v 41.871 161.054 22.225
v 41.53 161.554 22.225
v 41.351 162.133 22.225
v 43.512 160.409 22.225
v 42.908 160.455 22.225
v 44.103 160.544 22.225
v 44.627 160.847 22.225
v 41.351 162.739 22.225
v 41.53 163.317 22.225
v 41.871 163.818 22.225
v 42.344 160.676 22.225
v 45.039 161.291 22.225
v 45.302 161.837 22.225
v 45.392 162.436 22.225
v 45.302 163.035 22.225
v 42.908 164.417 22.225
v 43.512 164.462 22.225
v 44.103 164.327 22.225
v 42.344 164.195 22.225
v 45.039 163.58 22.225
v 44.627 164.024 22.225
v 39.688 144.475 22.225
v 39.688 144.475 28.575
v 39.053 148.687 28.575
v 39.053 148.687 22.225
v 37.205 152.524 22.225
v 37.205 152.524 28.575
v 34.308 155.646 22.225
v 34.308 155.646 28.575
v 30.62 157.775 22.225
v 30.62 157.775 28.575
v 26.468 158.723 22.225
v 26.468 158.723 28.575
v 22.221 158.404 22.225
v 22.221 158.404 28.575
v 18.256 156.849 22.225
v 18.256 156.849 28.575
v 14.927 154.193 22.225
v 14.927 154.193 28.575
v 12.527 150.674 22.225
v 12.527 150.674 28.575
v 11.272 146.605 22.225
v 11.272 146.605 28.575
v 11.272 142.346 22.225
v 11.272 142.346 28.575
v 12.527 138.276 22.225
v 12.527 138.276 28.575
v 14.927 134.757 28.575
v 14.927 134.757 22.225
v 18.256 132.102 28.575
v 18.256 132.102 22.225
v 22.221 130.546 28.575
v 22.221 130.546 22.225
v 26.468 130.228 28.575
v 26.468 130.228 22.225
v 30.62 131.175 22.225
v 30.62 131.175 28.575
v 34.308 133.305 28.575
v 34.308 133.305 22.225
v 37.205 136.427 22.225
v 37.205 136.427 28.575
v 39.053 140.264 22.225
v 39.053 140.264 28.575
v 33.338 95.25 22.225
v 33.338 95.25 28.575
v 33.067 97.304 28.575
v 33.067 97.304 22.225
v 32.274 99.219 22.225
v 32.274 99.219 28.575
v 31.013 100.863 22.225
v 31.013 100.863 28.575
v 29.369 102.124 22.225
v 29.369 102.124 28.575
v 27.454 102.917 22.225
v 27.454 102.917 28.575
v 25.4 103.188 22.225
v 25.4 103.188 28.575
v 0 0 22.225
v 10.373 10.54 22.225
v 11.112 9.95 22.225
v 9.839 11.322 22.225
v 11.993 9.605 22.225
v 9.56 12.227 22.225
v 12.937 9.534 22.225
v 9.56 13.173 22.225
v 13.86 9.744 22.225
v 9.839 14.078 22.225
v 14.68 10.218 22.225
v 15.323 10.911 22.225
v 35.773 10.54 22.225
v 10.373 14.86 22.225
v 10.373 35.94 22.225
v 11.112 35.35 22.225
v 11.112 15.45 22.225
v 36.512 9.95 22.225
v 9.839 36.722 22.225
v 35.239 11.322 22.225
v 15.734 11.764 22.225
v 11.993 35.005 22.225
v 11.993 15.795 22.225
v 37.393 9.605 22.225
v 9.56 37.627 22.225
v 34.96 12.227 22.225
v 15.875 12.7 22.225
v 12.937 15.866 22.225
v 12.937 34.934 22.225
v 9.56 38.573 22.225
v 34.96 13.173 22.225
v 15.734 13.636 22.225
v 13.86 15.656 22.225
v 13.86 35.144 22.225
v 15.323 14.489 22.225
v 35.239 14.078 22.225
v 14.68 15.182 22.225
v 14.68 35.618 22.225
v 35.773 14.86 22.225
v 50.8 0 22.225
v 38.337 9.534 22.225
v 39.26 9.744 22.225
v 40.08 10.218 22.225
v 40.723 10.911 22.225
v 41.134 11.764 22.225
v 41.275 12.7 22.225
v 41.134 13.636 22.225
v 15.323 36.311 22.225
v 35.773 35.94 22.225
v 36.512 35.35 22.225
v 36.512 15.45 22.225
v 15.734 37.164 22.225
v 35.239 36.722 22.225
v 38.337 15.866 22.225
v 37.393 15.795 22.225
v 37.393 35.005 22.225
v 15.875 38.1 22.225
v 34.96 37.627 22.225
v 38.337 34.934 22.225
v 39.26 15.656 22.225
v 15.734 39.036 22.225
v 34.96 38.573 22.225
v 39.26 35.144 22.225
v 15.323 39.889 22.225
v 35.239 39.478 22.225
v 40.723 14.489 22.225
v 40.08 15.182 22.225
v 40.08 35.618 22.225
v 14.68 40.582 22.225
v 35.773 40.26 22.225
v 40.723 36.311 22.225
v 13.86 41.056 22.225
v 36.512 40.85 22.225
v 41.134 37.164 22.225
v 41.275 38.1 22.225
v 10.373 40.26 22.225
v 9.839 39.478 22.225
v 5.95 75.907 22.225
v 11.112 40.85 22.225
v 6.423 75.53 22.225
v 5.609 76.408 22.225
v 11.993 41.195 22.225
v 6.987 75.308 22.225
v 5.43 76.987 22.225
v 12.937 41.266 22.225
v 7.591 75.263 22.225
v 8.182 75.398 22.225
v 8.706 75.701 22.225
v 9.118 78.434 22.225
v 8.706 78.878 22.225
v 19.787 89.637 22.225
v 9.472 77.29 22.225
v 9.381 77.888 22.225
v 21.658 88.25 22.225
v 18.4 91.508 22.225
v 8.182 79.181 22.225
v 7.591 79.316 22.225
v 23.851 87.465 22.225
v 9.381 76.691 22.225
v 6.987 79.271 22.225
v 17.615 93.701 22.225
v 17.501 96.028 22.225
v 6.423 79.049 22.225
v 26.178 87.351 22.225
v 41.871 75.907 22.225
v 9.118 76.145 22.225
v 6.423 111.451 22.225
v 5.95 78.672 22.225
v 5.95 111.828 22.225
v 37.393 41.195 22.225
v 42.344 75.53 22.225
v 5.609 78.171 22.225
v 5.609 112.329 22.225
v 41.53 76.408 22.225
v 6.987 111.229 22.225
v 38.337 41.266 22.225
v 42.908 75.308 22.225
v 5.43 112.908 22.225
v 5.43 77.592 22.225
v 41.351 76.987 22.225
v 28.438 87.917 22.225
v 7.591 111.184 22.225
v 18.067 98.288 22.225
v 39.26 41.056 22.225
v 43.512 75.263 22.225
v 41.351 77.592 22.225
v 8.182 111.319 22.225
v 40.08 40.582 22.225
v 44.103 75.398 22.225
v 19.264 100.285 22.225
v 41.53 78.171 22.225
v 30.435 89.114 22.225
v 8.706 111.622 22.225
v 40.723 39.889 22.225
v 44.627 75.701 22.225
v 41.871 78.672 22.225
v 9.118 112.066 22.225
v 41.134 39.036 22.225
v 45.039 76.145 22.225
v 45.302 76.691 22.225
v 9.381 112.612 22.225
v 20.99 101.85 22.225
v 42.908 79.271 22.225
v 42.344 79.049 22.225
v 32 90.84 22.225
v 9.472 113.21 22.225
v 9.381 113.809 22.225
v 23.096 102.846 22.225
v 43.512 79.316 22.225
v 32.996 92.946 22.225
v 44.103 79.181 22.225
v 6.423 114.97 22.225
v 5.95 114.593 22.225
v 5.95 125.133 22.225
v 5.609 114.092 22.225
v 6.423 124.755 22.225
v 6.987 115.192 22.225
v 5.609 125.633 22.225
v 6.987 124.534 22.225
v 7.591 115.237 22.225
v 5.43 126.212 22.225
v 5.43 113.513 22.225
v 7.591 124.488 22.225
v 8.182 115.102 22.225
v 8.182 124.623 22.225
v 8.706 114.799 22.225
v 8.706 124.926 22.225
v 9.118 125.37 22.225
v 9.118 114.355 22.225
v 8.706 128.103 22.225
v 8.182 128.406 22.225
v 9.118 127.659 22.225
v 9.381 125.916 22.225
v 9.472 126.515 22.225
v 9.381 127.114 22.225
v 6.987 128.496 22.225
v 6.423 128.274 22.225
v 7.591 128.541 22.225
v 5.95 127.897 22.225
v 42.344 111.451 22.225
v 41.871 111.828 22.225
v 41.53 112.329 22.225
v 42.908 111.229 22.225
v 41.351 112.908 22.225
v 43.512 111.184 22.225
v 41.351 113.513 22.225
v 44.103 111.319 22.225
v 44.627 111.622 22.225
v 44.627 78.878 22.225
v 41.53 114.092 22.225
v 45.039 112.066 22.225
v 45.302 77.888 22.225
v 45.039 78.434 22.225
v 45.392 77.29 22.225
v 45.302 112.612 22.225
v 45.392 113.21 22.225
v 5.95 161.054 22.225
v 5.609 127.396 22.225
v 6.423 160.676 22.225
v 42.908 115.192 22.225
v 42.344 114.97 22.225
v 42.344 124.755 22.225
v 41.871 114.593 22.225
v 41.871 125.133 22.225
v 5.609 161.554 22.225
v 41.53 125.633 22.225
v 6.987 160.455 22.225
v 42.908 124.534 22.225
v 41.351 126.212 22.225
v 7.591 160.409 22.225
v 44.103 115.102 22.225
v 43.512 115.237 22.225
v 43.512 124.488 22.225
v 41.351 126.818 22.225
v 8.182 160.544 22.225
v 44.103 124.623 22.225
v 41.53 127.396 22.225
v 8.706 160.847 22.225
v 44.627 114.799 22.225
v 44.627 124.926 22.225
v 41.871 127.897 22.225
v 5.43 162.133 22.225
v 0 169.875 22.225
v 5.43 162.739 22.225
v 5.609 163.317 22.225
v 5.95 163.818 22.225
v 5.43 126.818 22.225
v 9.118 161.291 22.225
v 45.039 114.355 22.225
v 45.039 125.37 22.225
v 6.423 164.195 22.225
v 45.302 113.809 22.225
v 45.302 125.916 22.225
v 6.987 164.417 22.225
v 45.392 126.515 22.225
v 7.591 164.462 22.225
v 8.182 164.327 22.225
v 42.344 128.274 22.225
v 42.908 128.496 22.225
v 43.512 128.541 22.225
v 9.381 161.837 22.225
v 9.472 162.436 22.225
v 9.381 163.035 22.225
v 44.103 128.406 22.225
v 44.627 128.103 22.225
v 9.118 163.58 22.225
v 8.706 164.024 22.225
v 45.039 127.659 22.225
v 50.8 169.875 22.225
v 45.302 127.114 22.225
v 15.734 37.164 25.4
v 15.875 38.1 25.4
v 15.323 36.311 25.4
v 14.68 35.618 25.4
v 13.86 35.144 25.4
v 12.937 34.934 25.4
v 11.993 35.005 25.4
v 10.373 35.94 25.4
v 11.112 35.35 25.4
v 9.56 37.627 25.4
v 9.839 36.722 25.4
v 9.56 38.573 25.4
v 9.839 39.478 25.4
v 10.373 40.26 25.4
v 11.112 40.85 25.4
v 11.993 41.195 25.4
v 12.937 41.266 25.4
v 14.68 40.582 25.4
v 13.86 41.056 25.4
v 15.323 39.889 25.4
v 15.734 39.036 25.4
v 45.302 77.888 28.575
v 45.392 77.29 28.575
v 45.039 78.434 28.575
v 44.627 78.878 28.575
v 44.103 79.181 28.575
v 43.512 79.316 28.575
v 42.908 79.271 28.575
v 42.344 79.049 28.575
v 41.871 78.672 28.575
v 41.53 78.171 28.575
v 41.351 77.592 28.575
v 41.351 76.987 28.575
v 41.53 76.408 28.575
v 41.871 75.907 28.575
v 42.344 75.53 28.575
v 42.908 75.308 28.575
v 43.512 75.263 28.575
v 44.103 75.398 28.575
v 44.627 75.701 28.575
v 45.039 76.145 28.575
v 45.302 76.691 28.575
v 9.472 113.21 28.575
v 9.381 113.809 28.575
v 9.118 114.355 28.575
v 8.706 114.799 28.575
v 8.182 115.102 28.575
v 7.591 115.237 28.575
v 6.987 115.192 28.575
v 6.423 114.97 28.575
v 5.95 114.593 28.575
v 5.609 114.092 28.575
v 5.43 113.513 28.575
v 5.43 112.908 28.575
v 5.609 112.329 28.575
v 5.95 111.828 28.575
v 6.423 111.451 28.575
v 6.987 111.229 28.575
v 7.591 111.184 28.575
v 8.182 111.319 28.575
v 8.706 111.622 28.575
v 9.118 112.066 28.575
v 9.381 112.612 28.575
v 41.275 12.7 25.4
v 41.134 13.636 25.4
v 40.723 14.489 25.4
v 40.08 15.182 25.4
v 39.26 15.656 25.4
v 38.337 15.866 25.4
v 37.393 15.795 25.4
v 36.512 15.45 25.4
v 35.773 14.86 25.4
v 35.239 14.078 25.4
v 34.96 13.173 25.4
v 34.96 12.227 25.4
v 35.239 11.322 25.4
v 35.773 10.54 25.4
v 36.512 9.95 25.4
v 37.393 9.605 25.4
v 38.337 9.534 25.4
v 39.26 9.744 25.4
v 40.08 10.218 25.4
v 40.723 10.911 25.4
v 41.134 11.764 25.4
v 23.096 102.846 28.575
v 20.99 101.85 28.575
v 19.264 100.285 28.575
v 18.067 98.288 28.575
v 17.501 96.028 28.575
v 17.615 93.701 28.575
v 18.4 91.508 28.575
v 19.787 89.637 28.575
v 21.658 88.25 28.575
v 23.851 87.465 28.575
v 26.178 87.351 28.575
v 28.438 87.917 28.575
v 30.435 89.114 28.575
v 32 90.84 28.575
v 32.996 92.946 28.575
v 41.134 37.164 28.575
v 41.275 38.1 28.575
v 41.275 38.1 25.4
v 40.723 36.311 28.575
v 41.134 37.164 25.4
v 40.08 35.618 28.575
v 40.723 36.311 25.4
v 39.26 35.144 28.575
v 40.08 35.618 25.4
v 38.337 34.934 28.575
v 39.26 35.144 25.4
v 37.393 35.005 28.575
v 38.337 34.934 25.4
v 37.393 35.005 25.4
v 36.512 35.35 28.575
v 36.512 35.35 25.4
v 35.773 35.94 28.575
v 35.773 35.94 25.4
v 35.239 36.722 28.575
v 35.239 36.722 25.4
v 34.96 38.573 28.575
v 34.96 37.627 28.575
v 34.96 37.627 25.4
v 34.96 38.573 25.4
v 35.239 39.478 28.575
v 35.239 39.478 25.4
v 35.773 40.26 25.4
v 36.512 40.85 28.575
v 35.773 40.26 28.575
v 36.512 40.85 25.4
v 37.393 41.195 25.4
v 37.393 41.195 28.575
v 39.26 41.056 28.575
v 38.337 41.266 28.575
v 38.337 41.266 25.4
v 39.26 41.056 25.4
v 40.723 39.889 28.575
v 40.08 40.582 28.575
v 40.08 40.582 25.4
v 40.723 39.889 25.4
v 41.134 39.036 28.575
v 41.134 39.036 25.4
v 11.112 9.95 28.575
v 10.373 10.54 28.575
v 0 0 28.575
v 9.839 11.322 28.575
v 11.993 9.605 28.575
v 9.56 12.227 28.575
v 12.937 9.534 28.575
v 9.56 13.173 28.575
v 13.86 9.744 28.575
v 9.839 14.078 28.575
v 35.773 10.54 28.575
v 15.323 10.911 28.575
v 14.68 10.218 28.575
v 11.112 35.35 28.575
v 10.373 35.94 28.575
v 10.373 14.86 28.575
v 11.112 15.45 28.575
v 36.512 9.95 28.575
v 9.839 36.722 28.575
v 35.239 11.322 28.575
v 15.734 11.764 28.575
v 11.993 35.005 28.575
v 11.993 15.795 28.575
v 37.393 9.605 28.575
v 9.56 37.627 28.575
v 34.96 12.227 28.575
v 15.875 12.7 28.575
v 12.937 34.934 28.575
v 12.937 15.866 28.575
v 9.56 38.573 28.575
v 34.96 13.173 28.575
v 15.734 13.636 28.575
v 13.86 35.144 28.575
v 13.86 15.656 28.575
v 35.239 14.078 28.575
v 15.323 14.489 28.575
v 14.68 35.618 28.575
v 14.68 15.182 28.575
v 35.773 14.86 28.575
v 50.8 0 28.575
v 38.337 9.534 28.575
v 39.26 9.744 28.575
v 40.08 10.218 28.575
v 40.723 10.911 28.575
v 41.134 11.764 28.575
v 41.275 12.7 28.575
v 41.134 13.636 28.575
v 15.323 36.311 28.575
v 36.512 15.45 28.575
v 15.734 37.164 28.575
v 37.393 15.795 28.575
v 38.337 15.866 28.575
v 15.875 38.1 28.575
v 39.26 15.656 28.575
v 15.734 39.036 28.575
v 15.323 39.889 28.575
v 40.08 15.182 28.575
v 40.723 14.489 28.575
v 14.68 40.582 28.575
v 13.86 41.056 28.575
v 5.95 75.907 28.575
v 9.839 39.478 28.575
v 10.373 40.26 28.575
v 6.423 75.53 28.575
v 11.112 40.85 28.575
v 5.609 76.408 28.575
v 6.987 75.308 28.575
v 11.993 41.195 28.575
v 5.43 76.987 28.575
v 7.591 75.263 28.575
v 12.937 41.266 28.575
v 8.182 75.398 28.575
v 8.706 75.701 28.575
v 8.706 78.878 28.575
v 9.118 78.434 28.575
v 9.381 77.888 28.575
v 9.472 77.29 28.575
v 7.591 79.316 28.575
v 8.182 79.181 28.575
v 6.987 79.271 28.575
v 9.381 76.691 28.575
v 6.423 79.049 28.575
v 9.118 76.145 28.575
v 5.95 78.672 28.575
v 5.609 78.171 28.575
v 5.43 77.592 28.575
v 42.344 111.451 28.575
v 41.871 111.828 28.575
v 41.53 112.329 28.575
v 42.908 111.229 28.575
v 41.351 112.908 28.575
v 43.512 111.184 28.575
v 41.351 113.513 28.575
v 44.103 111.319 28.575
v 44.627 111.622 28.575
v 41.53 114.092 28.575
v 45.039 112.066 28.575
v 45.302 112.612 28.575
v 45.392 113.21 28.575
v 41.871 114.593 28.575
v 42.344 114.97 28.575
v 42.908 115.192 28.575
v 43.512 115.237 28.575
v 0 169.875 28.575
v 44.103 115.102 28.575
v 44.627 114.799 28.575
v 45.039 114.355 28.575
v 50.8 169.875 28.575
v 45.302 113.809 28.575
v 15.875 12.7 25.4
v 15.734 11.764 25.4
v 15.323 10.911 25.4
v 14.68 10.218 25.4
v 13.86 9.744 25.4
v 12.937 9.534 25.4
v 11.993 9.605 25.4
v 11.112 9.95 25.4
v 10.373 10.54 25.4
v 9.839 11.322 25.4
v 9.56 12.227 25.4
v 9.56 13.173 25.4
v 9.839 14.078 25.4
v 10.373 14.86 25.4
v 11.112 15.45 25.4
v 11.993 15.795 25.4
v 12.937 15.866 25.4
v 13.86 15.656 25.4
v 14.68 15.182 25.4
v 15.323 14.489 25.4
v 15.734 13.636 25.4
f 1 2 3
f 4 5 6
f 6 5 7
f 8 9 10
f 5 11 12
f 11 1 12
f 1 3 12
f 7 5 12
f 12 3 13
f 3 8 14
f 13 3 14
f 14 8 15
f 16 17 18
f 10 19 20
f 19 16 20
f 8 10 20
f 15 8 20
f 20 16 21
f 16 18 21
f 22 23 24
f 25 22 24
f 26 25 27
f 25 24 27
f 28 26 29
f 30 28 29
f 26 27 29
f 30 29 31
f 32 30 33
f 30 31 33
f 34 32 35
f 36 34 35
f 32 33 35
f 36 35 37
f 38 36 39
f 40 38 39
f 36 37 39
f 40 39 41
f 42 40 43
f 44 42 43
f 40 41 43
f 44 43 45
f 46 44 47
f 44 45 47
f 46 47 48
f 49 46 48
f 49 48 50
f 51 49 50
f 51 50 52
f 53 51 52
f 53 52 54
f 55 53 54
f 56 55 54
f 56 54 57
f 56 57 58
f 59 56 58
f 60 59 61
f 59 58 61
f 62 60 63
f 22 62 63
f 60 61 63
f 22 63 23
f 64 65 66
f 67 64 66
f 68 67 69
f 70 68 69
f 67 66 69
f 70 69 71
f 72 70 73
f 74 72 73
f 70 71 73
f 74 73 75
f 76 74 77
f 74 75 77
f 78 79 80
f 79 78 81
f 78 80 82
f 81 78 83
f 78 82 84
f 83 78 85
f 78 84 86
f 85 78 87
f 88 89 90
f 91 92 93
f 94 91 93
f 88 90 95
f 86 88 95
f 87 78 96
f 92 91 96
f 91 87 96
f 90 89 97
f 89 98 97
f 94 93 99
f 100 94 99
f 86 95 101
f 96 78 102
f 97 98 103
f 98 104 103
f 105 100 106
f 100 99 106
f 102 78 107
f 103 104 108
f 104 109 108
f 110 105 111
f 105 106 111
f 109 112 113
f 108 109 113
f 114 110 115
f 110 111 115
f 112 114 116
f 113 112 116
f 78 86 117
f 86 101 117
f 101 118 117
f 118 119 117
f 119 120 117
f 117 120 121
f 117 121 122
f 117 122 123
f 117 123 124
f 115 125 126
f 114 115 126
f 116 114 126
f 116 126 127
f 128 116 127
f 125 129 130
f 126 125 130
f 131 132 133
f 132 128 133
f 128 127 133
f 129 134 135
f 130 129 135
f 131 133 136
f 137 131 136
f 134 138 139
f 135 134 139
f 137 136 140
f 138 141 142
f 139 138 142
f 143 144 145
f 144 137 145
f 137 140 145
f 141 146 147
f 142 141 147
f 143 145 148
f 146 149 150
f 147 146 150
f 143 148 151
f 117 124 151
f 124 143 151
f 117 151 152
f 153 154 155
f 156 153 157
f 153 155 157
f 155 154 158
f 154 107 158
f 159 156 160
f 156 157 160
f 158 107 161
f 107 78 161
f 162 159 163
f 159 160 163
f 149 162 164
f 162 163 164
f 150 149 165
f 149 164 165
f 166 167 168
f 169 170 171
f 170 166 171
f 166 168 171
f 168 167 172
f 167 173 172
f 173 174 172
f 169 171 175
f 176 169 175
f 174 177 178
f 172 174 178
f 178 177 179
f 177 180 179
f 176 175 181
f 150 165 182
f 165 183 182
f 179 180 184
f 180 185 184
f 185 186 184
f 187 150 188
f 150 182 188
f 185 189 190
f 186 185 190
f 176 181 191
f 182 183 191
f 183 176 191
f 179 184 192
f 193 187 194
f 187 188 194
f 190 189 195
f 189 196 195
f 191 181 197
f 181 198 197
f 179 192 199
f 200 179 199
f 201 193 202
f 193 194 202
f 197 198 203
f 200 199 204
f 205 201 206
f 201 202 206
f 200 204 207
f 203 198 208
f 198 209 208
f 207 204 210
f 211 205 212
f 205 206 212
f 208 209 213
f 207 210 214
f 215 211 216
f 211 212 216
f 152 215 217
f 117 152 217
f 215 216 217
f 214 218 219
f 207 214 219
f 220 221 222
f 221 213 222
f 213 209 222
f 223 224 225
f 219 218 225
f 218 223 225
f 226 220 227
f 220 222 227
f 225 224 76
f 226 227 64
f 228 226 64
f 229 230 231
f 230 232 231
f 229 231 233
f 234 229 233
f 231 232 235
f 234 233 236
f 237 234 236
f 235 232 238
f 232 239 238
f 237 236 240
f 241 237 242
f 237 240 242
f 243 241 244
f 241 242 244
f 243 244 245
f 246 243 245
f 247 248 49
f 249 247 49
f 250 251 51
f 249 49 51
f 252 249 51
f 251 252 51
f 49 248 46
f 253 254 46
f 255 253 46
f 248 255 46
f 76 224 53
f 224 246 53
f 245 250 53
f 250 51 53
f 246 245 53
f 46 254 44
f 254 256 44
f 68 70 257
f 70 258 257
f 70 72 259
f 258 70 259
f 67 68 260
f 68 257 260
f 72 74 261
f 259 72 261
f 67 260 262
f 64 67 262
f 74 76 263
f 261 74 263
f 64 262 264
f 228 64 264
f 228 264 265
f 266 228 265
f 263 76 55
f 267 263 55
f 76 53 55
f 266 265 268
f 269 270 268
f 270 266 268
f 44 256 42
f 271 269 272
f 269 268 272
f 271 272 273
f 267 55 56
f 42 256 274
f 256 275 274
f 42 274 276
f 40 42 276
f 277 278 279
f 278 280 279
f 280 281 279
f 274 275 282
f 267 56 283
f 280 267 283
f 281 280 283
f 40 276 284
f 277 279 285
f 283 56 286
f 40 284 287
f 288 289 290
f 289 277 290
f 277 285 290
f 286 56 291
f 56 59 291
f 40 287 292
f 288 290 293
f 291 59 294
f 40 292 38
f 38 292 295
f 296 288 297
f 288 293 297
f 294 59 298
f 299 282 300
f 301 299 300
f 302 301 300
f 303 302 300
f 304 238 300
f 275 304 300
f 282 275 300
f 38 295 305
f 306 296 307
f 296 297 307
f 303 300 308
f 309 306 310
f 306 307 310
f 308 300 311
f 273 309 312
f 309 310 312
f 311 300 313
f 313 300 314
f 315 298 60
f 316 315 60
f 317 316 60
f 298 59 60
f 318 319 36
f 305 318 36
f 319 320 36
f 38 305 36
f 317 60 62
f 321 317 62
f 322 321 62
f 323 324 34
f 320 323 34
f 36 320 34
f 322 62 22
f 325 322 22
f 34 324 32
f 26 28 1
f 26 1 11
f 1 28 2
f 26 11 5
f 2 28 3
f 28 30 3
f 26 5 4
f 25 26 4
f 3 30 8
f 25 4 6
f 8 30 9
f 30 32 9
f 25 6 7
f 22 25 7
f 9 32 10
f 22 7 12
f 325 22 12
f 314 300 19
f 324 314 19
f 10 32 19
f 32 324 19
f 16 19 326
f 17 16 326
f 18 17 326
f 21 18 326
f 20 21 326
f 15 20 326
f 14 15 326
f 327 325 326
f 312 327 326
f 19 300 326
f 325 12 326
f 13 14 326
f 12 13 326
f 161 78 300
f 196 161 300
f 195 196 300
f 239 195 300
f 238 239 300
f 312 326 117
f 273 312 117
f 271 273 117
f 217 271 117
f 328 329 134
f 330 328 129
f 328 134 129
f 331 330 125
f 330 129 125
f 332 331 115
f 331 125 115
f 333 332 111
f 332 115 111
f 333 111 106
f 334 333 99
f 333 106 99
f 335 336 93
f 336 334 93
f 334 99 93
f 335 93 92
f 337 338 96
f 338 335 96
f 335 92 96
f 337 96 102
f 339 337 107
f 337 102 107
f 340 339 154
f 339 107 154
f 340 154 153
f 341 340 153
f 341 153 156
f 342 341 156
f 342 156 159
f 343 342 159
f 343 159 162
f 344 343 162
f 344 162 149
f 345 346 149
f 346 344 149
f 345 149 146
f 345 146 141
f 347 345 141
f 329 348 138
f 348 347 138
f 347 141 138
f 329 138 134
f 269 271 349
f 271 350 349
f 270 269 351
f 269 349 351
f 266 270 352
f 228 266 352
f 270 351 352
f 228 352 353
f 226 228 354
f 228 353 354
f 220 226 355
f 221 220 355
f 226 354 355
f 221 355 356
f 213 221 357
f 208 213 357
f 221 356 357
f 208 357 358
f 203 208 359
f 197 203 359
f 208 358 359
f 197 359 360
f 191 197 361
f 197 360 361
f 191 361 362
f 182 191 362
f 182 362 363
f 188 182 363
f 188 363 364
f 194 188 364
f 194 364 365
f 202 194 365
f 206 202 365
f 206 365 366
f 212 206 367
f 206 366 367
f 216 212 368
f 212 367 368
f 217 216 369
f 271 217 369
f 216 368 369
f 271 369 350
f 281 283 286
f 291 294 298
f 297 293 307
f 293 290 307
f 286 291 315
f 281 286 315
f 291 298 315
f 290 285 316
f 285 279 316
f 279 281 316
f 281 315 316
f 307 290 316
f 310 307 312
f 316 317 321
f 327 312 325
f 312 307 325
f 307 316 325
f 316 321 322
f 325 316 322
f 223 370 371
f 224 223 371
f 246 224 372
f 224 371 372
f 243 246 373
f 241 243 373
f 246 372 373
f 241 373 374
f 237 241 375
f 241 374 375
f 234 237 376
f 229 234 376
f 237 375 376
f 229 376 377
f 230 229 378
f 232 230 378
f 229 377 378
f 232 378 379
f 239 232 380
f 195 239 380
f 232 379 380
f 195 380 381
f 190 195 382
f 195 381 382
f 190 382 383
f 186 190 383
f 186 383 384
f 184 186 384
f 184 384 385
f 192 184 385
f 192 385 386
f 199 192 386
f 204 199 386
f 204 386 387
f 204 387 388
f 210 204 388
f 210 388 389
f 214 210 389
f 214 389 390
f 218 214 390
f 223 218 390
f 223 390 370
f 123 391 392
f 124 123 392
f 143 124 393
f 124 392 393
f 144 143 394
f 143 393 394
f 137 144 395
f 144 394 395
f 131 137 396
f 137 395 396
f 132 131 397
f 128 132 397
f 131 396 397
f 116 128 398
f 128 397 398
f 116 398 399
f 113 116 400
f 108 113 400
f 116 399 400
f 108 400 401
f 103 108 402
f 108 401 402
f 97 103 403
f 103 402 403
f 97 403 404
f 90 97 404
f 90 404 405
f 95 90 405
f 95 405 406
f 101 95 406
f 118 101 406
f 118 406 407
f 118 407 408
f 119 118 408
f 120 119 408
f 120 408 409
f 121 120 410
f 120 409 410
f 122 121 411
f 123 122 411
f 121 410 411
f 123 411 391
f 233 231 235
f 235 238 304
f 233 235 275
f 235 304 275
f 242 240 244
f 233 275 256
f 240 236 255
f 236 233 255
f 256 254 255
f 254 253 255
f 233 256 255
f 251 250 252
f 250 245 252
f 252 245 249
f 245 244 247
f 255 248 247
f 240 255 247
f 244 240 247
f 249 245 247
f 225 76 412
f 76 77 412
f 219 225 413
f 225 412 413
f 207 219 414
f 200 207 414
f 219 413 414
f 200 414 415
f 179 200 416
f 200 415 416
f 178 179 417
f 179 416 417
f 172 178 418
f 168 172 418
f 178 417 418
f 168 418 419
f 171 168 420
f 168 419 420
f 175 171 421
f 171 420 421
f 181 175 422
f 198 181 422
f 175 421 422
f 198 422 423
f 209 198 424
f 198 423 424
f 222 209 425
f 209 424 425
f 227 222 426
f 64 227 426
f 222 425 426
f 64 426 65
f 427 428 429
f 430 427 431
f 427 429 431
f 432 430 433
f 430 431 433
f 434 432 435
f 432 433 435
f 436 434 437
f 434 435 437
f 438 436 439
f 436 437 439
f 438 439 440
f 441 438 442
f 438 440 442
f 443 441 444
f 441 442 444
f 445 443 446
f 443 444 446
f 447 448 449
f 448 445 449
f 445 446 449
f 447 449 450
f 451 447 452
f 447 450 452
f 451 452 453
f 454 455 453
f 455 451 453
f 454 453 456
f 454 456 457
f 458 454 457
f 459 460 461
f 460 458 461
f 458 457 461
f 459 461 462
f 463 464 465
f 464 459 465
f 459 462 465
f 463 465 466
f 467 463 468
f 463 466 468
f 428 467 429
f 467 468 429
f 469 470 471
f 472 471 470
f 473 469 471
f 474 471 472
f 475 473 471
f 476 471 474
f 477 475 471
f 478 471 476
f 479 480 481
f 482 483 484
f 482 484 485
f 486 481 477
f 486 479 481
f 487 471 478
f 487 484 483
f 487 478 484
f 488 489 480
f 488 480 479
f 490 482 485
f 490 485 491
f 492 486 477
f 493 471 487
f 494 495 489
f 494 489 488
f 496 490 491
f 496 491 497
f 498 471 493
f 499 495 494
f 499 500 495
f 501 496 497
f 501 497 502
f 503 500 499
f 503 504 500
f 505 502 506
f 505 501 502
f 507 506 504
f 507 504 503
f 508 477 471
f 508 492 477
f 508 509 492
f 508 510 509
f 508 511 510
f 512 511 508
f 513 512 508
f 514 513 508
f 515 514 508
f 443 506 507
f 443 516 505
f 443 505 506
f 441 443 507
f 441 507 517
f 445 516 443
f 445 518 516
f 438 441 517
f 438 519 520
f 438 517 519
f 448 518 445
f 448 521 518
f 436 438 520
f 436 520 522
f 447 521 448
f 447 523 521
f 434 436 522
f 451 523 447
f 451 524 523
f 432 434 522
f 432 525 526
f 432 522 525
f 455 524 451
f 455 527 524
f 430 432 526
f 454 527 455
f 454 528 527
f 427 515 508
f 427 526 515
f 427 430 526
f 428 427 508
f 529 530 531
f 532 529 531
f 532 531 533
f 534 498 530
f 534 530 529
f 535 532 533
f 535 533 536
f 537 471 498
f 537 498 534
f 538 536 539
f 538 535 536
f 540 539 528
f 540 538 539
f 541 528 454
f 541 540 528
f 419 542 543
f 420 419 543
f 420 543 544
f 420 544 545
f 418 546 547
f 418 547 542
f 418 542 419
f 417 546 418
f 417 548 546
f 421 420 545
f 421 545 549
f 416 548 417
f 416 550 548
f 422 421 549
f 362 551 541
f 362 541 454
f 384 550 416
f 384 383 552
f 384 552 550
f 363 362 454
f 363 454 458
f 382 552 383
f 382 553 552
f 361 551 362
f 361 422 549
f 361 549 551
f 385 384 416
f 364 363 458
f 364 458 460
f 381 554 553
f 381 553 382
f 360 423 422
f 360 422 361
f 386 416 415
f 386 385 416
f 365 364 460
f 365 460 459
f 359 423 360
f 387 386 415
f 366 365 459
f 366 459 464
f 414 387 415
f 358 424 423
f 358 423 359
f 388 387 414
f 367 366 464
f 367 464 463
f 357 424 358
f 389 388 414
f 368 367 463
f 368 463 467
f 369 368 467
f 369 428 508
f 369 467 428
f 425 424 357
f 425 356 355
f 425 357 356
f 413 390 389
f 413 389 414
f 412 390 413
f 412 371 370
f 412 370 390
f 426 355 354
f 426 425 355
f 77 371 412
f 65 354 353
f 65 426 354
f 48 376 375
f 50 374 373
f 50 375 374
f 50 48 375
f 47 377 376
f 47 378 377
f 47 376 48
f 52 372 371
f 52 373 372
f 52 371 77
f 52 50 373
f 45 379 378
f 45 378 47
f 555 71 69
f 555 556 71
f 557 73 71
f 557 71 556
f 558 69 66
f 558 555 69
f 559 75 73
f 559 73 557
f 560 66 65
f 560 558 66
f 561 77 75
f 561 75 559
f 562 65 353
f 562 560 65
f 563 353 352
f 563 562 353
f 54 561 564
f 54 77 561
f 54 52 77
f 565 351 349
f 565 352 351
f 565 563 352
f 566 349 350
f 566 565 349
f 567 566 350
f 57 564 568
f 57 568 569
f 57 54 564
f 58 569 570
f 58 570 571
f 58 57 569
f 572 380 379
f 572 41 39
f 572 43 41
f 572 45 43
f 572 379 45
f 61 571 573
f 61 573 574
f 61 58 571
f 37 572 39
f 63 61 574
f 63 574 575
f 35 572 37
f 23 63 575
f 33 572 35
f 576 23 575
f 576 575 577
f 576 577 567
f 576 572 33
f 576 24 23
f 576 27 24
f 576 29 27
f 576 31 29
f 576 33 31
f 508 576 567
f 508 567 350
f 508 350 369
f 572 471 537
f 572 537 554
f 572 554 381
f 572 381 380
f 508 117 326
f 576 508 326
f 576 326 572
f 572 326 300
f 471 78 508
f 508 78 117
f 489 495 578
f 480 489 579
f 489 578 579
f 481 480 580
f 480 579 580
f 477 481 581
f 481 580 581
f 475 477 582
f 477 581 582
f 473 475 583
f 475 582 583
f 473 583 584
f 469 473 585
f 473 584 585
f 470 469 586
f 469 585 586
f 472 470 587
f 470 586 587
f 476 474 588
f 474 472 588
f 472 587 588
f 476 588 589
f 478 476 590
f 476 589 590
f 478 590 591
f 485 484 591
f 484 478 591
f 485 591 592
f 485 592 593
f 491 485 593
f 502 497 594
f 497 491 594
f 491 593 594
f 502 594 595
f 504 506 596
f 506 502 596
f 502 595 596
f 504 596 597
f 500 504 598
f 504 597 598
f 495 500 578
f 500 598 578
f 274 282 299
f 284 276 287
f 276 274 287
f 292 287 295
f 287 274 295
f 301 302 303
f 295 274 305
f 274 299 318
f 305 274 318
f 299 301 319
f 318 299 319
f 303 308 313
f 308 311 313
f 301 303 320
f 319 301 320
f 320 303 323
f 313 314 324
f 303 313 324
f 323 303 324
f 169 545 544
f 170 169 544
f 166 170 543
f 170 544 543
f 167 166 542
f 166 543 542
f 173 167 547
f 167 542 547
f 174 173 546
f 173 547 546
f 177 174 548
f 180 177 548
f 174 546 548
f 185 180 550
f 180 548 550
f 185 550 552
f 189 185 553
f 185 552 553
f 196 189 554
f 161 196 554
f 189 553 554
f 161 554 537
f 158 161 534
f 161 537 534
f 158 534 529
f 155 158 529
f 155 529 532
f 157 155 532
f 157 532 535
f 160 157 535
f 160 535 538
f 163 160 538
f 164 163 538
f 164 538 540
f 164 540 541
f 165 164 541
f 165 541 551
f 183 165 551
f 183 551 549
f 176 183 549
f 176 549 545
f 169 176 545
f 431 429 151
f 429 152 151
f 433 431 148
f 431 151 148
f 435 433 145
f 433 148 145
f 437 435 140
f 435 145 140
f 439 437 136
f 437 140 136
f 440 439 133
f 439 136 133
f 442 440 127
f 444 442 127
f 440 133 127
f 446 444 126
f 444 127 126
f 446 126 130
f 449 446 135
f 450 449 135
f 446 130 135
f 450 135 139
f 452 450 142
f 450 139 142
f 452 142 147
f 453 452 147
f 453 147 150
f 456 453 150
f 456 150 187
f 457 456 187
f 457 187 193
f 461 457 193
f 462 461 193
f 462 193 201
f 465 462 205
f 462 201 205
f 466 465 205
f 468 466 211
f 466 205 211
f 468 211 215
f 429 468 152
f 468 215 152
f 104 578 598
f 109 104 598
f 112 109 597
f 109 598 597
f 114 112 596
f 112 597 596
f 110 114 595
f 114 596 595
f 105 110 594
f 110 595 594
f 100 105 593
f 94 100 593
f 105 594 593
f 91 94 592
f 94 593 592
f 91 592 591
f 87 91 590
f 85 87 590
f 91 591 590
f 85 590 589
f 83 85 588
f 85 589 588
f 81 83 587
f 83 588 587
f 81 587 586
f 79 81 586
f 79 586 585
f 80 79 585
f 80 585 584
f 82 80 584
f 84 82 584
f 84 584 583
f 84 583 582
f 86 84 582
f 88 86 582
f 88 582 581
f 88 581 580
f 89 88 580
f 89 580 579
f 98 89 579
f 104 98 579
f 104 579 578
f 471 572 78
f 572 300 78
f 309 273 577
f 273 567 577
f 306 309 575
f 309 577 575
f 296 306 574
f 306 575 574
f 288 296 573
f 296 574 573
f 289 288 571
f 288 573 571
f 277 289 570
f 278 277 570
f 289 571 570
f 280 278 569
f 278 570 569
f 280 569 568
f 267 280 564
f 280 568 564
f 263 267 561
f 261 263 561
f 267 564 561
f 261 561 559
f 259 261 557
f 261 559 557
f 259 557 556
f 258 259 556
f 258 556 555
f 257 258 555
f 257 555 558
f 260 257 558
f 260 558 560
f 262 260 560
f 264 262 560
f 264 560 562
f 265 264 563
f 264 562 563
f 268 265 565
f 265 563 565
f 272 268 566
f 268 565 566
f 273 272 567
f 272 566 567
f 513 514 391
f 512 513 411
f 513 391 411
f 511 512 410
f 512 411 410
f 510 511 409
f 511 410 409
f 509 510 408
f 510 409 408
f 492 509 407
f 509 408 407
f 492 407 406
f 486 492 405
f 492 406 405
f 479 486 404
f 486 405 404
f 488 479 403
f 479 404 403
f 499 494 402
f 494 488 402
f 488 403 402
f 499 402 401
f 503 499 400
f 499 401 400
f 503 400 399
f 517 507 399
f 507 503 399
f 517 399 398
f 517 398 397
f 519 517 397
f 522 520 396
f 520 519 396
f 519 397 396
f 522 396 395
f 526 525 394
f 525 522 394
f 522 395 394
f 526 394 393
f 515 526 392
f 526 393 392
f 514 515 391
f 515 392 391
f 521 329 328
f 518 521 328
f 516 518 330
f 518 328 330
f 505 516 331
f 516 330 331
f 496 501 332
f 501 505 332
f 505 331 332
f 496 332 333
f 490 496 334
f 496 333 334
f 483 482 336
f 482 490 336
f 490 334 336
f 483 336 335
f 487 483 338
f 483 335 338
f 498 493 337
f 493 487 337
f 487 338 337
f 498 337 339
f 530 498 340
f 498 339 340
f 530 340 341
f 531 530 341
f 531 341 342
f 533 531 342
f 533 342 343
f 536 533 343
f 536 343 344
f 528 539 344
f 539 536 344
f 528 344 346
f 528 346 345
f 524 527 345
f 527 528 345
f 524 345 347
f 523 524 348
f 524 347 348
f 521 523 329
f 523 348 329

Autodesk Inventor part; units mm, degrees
ref_plane "YZ Plane" through (0, 0, 0) normal (1, 0, 0) x (0, 1, 0)
ref_plane "XZ Plane" through (0, 0, 0) normal (0, 1, 0) x (-1, 0, 0)
ref_plane "XY Plane" through (0, 0, 0) normal (0, 0, 1) x (1, 0, 0)
sketch "Sketch1" plane through (0, 0, 0) normal (0, 0, 1) x (1, 0, 0)
  line L0 (0, 0) -> (50.8, 0)
  line L1 (50.8, 0) -> (50.8, 169.8752)
  line L2 (50.8, 169.8752) -> (0, 169.8752)
  line L3 (0, 169.8752) -> (0, 0)
  line L4 (25.4, 169.8752) -> (25.4, 144.4752)
  line L5 (25.4, 169.8752) -> (50.8, 169.8752) construction
  circle A0 centre (25.4, 144.4752) radius 14.2875
  line L6 (25.4, 144.4752) -> (43.3605, 162.4357)
  line L7 (25.4, 144.4752) -> (50.8, 144.4752) construction
  line L8 (7.4395, 126.5147) -> (43.3605, 126.5147)
  line L9 (43.3605, 162.4357) -> (7.4395, 162.4357)
  line L10 (7.4395, 162.4357) -> (7.4395, 126.5147)
  circle A1 centre (7.4395, 162.4357) radius 2.032
  circle A2 centre (7.4395, 126.5147) radius 2.032
  circle A3 centre (43.3605, 162.4357) radius 2.032
  circle A4 centre (43.3605, 126.5147) radius 2.032
  line L11 (0, 0) -> (50.8, 0)
  line L12 (50.8, 0) -> (50.8, 38.1)
  line L13 (0, 38.1) -> (0, 0)
  line L14 (25.4, 38.1) -> (12.7, 38.1)
  line L15 (25.4, 38.1) -> (38.1, 38.1) construction
  line L16 (12.7, 38.1) -> (38.1, 38.1)
  circle A5 centre (12.7, 38.1) radius 3.175
  circle A6 centre (38.1, 38.1) radius 3.175
  dimension "d0" = 50.8
  dimension "d1" = 169.8752
  dimension "d2" = 25.4
  dimension "d3" = 90
  dimension "d4" = 28.575
  dimension "d5" = 25.4
  dimension "d6" = 45
  dimension "d7" = 50.8
  dimension "d9" = 4.064
  dimension "d10" = 4.064
  dimension "d11" = 4.064
  dimension "d12" = 4.064
  dimension "d13" = 50.8
  dimension "d14" = 38.1
  dimension "d15" = 12.7
  dimension "d16" = 180
  dimension "d17" = 25.4
  dimension "d18" = 0
  dimension "d19" = 6.35
  dimension "d20" = 6.35
extrude "Extrusion1" add sketch "Sketch1" along normal blind 25.4 contours L9 A3 L6 A0 L4 | L3 L2 L1 L0
sketch "Sketch2" plane through (0, 169.8752, 0) normal (0, 1, 0) x (1, 0, 0)
  line L0 (0, 0) -> (3.175, 0)
  line L1 (3.175, 0) -> (3.175, -3.175)
  line L2 (3.175, -3.175) -> (0, -3.175)
  line L3 (0, -3.175) -> (0, 0)
  line L4 (3.175, -3.175) -> (47.625, -3.175)
  line L5 (47.625, -3.175) -> (47.625, -22.225)
  line L6 (47.625, -22.225) -> (3.175, -22.225)
  line L7 (3.175, -22.225) -> (3.175, -3.175)
  dimension "d23" = 3.175
  dimension "d24" = 3.175
  dimension "d25" = 44.45
  dimension "d26" = 19.05
extrude "Extrusion2" cut sketch "Sketch2" against normal blind 254 contours L4 L5 L6 L7
sketch "Sketch3" plane through (0, 0, 25.4) normal (0, 0, 1) x (1, 0, 0)
  circle A0 centre (12.7, 38.1) radius 3.175 projected
  line L0 (12.7, 38.1) -> (38.1, 38.1)
  line L1 (38.1, 38.1) -> (38.1, 12.7)
  line L2 (38.1, 12.7) -> (12.7, 12.7)
  line L3 (12.7, 12.7) -> (12.7, 38.1)
  circle A1 centre (12.7, 12.7) radius 3.175
  circle A2 centre (38.1, 12.7) radius 3.175
  dimension "d29" = 25.4
  dimension "d30" = 25.4
  dimension "d31" = 6.35
  dimension "d32" = 6.35
extrude "Extrusion3" cut sketch "Sketch3" against normal blind 25.4 contours A1 L2 L3 | L3 L2 A1 | A2 L2 L1 | L1 L2 A2
sketch "Sketch4" plane through (0, 169.8752, 0) normal (0, 1, 0) x (1, 0, 0)
  line L0 (47.625, -22.225) -> (3.175, -22.225) projected
  line L1 (3.175, -22.225) -> (3.175, -3.175) projected
  line L2 (3.175, -3.175) -> (47.625, -3.175) projected
  line L3 (47.625, -3.175) -> (47.625, -22.225) projected
  line L4 (50.8, 0) -> (50.8, -25.4) projected
  line L5 (0, 0) -> (50.8, 0)
  line L6 (50.8, 0) -> (50.8, -22.225)
  line L7 (50.8, -22.225) -> (0, -22.225)
  line L8 (0, -22.225) -> (0, 0)
extrude "Extrusion4" cut sketch "Sketch4" against normal blind 254 contours L3 L2 L1 L7 L8 L5 L4
sketch "Sketch5" plane through (0, 0, 25.4) normal (0, 0, 1) x (1, 0, 0)
  circle A0 centre (38.1, 12.7) radius 3.175 projected
  circle A1 centre (12.7, 12.7) radius 3.175 projected
  circle A2 centre (25.4, 144.4752) radius 14.2875 projected
  circle A3 centre (38.1, 38.1) radius 3.175 projected
  circle A4 centre (12.7, 38.1) radius 3.175 projected
  circle A5 centre (43.3605, 126.5147) radius 2.032 projected
  circle A6 centre (43.3605, 162.4357) radius 2.032 projected
  circle A7 centre (7.4395, 126.5147) radius 2.032 projected
  circle A8 centre (7.4395, 162.4357) radius 2.032 projected
  line L0 (0, 0) -> (50.8, 0) projected
  line L1 (50.8, 0) -> (50.8, 169.8752) projected
  line L2 (50.8, 169.8752) -> (0, 169.8752) projected
  line L3 (0, 169.8752) -> (0, 0) projected
extrude "Extrusion5" add sketch "Sketch5" along normal blind 3.175
sketch "Sketch6" plane through (0, 0, 28.575) normal (0, 0, 1) x (1, 0, 0)
  circle A0 centre (25.4, 144.4752) radius 14.2875 projected
  circle A1 centre (25.4, 144.4752) radius 9.525
  dimension "d39" = 19.05
extrude "Extrusion6" add sketch "Sketch6" against normal blind 6.35
sketch "Sketch7" plane through (0, 0, 28.575) normal (0, 0, 1) x (1, 0, 0)
  line L0 (50.8, 169.8752) -> (0, 169.8752) projected
  line L1 (0, 169.8752) -> (0, 0) projected
  line L2 (25.4, 169.8752) -> (25.4, 95.25)
  line L3 (25.4, 169.8752) -> (100.0252, 169.8752) construction
  circle A0 centre (25.4, 95.25) radius 7.9375
  dimension "d43" = 74.6252
  dimension "d44" = 90
  dimension "d45" = 15.875
extrude "Extrusion7" cut sketch "Sketch7" against normal blind 25.4
sketch "Sketch8" plane through (0, 0, 28.575) normal (0, 0, 1) x (1, 0, 0)
  circle A0 centre (25.4, 144.4752) radius 9.525 projected
  circle A1 centre (25.4, 144.4752) radius 14.2875
  dimension "d48" = 28.575
extrude "Extrusion8" cut sketch "Sketch8" against normal blind 25.4
sketch "Sketch9" plane through (0, 0, 28.575) normal (0, 0, 1) x (1, 0, 0)
  circle A0 centre (25.4, 95.25) radius 7.9375 projected
  circle A1 centre (7.4395, 162.4357) radius 2.032 projected
  circle A2 centre (7.4395, 126.5147) radius 2.032 projected
  circle A3 centre (43.3605, 162.4357) radius 2.032 projected
  circle A4 centre (43.3605, 126.5147) radius 2.032 projected
  line L0 (25.4, 95.25) -> (43.3605, 113.2105)
  line L1 (25.4, 95.25) -> (50.8, 95.25) construction
  line L2 (43.3605, 113.2105) -> (7.4395, 77.2895)
  circle A5 centre (7.4395, 113.2105) radius 2.032
  circle A6 centre (43.3605, 113.2105) radius 2.032
  circle A7 centre (43.3605, 77.2895) radius 2.032
  circle A8 centre (7.4395, 77.2895) radius 2.032
  dimension "d51" = 25.4
  dimension "d52" = 45
  dimension "d53" = 50.8
  dimension "d54" = 0
  dimension "d55" = 4.064
  dimension "d56" = 4.064
  dimension "d57" = 4.064
  dimension "d58" = 4.064
extrude "Extrusion9" cut sketch "Sketch9" against normal blind 6.35 contours A8 | A6 | A1 | A2 | A3 | A4 | A5 | A7
sketch "Sketch10" plane through (0, 0, 28.575) normal (0, 0, 1) x (1, 0, 0)
  circle A0 centre (7.4395, 162.4357) radius 2.032 projected
  circle A1 centre (7.4395, 126.5147) radius 2.032 projected
  circle A2 centre (43.3605, 162.4357) radius 2.032 projected
  circle A3 centre (43.3605, 126.5147) radius 2.032 projected
extrude "Extrusion10" add sketch "Sketch10" against normal blind 6.35
properties part number "Z-Plate"
